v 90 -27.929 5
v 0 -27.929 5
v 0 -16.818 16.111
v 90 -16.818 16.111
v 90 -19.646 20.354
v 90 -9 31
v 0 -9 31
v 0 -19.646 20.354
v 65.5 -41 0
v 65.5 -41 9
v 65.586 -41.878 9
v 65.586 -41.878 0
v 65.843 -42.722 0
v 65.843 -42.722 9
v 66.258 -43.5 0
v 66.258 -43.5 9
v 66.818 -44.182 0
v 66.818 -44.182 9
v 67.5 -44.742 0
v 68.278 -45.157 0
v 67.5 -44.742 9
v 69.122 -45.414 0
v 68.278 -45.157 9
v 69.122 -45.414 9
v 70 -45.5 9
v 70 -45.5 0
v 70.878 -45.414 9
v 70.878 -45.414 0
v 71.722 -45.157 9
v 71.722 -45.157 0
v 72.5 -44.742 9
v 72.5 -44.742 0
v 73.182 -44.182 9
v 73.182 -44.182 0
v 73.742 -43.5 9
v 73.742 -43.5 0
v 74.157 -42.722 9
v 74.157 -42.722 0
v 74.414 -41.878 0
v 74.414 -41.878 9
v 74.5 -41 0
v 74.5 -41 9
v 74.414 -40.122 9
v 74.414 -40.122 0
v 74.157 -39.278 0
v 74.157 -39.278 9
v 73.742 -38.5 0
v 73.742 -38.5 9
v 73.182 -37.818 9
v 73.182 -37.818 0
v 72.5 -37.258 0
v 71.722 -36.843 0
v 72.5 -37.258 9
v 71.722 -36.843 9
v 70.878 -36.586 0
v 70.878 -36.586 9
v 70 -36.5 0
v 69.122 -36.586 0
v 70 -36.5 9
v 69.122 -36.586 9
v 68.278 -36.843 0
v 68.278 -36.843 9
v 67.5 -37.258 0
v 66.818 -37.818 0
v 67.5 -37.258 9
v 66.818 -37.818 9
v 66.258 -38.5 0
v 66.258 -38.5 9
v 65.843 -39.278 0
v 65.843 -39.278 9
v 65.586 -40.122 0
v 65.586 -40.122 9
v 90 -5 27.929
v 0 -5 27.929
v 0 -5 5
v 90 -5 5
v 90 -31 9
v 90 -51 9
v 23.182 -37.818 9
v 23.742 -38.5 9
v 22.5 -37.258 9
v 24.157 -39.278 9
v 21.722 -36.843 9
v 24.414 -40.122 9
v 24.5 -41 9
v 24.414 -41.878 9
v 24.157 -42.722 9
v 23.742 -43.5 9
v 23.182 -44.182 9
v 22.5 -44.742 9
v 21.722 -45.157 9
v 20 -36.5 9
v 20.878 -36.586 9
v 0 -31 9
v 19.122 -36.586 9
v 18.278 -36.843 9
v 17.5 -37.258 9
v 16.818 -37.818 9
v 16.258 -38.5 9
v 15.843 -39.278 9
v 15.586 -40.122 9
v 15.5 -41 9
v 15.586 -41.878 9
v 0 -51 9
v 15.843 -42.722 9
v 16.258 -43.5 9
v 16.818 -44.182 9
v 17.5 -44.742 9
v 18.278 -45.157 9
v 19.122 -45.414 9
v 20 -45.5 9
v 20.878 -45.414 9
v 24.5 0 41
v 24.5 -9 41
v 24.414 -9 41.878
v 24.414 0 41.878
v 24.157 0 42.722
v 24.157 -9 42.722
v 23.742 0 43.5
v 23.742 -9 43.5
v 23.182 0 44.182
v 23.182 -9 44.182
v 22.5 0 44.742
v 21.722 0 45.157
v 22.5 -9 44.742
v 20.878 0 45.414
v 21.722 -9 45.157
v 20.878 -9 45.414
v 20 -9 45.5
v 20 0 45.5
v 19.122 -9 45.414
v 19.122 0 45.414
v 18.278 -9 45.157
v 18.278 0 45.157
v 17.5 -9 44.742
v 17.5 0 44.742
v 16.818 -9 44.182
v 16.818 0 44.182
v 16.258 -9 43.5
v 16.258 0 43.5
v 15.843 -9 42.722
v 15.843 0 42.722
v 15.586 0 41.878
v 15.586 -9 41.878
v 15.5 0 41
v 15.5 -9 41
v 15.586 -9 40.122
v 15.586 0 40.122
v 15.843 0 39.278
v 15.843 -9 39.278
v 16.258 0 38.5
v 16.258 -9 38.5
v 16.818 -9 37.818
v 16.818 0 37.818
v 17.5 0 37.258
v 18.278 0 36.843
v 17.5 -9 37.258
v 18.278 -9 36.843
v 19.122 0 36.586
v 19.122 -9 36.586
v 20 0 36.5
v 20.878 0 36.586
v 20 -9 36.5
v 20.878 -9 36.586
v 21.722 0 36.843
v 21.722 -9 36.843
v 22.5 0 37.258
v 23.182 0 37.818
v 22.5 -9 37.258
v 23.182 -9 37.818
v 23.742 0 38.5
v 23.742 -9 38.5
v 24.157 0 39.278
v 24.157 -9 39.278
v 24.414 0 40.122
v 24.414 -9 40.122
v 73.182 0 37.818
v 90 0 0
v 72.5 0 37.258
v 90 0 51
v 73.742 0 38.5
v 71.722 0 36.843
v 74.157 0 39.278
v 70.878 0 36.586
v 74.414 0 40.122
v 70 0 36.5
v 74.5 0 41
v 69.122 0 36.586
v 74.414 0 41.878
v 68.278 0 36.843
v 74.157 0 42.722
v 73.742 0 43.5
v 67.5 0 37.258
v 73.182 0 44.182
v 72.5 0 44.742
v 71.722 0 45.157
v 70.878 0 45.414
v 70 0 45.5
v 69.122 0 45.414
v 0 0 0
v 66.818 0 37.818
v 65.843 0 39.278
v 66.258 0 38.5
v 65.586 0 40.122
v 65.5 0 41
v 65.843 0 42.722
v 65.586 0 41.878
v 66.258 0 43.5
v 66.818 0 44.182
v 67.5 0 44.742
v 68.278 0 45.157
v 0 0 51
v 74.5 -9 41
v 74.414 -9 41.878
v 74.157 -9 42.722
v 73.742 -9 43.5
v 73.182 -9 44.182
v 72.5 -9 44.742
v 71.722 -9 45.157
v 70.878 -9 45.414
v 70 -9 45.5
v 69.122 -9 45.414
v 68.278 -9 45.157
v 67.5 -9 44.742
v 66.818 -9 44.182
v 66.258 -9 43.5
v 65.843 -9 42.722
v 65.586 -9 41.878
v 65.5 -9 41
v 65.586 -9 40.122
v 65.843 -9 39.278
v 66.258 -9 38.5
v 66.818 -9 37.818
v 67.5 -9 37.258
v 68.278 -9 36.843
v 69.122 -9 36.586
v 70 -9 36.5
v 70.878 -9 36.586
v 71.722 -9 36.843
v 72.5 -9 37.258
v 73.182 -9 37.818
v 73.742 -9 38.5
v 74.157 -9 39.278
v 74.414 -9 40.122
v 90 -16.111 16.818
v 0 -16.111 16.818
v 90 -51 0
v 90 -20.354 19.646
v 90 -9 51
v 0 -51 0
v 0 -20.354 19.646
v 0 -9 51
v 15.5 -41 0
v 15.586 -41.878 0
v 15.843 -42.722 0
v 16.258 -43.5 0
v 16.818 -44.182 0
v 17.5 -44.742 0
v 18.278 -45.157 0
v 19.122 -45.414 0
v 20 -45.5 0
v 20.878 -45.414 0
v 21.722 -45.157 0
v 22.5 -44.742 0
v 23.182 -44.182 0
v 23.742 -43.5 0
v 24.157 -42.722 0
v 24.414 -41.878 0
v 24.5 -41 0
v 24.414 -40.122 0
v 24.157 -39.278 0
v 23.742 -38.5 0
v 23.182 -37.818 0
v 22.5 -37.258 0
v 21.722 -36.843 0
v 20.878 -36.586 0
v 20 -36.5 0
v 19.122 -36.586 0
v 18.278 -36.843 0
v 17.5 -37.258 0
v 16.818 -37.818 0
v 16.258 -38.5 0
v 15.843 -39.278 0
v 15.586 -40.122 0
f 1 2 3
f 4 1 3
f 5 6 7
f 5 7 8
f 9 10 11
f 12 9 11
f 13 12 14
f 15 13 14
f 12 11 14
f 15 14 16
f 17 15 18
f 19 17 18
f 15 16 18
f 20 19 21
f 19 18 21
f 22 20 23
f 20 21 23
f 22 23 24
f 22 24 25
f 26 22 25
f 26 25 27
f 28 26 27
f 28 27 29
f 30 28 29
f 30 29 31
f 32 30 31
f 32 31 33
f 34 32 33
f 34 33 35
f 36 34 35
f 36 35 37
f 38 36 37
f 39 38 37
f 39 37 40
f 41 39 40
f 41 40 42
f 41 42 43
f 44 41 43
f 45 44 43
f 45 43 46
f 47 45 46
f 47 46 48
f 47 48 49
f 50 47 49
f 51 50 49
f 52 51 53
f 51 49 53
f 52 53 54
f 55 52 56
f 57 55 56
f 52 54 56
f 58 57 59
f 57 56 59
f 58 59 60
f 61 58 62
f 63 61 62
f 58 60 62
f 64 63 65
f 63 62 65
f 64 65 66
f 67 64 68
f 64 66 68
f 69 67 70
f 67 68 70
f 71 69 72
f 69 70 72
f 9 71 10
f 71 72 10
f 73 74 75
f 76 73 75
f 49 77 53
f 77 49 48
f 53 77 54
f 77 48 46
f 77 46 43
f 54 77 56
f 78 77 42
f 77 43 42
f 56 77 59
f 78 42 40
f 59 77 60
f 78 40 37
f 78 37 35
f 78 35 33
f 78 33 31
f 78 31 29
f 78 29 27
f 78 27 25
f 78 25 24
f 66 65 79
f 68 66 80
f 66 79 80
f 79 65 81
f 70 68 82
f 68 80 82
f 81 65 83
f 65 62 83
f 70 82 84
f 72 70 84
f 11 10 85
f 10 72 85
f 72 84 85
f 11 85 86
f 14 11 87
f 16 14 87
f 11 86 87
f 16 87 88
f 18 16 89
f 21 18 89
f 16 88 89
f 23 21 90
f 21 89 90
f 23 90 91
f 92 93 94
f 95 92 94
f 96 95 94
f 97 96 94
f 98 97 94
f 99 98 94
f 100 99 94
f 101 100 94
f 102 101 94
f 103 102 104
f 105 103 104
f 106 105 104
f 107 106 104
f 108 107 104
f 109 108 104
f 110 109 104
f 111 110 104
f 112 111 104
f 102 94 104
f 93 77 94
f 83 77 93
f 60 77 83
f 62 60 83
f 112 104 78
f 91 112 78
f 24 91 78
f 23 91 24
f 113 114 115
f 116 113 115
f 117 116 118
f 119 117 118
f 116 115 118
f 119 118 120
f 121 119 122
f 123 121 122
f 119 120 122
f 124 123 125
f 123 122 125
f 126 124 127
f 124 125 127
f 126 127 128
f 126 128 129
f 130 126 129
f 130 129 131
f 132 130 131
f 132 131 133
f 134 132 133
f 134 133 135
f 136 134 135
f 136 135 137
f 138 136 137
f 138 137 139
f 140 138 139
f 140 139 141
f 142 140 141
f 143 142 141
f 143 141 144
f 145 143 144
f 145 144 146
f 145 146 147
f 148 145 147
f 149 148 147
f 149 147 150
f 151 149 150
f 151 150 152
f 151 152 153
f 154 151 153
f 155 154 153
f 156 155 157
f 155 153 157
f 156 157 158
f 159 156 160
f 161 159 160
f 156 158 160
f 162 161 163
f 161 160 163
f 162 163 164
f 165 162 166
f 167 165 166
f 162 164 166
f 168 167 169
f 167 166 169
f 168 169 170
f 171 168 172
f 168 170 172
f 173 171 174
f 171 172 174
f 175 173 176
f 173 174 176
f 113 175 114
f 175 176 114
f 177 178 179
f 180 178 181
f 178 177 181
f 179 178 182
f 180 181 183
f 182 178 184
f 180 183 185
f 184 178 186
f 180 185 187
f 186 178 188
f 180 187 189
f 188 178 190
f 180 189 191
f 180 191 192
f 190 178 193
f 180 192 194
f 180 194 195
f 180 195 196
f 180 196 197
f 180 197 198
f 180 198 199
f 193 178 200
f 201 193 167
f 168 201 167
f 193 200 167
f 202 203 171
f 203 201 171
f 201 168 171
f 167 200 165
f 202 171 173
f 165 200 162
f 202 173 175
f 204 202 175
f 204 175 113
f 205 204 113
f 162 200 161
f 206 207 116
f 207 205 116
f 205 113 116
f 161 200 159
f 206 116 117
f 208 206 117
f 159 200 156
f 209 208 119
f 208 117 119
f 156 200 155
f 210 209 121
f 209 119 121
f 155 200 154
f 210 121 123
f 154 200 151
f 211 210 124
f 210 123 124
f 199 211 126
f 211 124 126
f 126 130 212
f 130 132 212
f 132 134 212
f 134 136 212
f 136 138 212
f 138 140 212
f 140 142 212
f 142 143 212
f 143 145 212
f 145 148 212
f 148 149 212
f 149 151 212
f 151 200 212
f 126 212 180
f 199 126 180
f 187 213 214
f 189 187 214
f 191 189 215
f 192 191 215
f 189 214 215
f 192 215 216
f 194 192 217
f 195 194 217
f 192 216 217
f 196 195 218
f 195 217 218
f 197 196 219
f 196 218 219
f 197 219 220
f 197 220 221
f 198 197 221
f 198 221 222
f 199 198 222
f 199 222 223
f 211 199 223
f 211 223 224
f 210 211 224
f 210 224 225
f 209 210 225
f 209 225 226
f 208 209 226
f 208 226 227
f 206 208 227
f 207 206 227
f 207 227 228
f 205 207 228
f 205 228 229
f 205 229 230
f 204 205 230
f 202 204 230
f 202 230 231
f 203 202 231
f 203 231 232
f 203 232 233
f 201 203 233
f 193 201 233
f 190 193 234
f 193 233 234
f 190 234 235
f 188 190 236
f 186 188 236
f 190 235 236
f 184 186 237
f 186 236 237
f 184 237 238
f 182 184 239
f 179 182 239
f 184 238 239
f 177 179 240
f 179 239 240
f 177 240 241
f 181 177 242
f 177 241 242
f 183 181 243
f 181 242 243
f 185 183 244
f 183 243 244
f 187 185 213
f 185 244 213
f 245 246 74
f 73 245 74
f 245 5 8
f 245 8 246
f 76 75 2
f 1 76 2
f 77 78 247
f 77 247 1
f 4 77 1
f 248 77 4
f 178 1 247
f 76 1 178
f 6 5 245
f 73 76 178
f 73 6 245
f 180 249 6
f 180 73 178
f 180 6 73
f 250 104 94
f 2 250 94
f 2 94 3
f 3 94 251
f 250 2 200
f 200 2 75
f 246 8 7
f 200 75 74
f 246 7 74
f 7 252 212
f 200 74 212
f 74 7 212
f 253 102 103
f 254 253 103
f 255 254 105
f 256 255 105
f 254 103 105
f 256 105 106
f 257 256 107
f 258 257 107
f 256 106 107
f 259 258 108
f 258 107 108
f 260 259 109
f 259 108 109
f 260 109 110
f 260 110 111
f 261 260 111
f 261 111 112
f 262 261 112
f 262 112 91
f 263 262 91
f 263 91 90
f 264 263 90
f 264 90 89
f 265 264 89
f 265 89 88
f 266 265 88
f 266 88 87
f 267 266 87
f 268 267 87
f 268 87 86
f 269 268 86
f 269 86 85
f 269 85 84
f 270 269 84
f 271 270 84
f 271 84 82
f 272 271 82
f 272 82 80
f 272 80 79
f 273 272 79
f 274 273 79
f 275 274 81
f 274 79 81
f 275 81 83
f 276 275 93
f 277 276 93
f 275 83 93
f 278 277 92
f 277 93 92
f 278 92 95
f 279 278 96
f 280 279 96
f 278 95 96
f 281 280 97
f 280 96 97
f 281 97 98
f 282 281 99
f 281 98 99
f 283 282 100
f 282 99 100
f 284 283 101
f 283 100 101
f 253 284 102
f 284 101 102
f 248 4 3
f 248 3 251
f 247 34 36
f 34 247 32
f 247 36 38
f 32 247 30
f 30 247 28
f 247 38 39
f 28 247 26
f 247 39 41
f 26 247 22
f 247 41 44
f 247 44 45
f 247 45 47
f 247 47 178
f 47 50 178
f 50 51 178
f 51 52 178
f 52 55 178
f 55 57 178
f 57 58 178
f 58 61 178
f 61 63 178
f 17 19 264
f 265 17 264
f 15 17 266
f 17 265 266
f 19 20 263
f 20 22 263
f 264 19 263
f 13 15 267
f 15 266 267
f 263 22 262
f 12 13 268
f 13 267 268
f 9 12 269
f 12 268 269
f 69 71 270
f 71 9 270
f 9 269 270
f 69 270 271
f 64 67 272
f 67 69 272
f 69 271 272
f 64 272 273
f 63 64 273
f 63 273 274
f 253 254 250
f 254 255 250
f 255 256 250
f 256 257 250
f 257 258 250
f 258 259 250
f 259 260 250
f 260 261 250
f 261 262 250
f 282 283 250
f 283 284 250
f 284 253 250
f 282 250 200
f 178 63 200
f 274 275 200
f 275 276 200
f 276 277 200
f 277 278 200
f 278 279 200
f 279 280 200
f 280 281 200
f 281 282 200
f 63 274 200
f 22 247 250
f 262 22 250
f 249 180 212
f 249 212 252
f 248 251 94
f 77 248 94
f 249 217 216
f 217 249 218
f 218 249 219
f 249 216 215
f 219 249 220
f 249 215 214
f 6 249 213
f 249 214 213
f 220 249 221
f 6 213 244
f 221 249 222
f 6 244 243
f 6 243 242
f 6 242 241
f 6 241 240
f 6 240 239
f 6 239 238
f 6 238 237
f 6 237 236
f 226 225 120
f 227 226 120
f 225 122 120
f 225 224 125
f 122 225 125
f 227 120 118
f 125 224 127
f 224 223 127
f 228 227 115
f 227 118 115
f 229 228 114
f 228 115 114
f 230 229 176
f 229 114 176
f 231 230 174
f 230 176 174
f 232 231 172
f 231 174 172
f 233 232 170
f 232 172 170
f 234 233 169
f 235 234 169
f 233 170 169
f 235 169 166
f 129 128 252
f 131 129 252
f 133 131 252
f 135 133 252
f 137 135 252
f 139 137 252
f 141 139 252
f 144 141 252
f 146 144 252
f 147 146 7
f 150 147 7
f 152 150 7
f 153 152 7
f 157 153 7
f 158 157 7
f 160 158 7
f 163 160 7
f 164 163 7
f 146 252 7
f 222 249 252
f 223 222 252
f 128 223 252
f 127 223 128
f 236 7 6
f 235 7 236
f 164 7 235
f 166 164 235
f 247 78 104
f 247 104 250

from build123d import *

# Parameters (mm, degrees)
F1_DEPTH   = 90
F4_D       = 9
F4_ON_F2_D = 9


with BuildPart() as f1:
    # F0 (on Right) → F1 (new body)
    with BuildSketch(Plane.YZ):
        Polygon((-51, 0), (0, 0), (0, 51), (-9, 51), (-9, 31), (-19.6464466094, 20.3535533906), (-16.1109127035, 16.8180194847), (-5, 27.9289321881), (-5, 5), (-27.9289321881, 5), (-16.8180194847, 16.1109127035), (-20.3535533906, 19.6464466094), (-31, 9), (-51, 9), align=None)
    extrude(amount=F1_DEPTH)

    # F4 (through all)
    with Locations(Plane(origin=(0, 0, 0), x_dir=(1, 0, 0), z_dir=(0, 0, -1))):
        with Locations((70, 41), (20, 41)):
            Hole(F4_D / 2)

    # F4 on F2 (through all)
    with Locations(Plane(origin=(0, 0, 0), x_dir=(-1, 0, 0), z_dir=(0, 1, 0))):
        with Locations((-20, 41), (-70, 41)):
            Hole(F4_ON_F2_D / 2)


solid = f1.part
